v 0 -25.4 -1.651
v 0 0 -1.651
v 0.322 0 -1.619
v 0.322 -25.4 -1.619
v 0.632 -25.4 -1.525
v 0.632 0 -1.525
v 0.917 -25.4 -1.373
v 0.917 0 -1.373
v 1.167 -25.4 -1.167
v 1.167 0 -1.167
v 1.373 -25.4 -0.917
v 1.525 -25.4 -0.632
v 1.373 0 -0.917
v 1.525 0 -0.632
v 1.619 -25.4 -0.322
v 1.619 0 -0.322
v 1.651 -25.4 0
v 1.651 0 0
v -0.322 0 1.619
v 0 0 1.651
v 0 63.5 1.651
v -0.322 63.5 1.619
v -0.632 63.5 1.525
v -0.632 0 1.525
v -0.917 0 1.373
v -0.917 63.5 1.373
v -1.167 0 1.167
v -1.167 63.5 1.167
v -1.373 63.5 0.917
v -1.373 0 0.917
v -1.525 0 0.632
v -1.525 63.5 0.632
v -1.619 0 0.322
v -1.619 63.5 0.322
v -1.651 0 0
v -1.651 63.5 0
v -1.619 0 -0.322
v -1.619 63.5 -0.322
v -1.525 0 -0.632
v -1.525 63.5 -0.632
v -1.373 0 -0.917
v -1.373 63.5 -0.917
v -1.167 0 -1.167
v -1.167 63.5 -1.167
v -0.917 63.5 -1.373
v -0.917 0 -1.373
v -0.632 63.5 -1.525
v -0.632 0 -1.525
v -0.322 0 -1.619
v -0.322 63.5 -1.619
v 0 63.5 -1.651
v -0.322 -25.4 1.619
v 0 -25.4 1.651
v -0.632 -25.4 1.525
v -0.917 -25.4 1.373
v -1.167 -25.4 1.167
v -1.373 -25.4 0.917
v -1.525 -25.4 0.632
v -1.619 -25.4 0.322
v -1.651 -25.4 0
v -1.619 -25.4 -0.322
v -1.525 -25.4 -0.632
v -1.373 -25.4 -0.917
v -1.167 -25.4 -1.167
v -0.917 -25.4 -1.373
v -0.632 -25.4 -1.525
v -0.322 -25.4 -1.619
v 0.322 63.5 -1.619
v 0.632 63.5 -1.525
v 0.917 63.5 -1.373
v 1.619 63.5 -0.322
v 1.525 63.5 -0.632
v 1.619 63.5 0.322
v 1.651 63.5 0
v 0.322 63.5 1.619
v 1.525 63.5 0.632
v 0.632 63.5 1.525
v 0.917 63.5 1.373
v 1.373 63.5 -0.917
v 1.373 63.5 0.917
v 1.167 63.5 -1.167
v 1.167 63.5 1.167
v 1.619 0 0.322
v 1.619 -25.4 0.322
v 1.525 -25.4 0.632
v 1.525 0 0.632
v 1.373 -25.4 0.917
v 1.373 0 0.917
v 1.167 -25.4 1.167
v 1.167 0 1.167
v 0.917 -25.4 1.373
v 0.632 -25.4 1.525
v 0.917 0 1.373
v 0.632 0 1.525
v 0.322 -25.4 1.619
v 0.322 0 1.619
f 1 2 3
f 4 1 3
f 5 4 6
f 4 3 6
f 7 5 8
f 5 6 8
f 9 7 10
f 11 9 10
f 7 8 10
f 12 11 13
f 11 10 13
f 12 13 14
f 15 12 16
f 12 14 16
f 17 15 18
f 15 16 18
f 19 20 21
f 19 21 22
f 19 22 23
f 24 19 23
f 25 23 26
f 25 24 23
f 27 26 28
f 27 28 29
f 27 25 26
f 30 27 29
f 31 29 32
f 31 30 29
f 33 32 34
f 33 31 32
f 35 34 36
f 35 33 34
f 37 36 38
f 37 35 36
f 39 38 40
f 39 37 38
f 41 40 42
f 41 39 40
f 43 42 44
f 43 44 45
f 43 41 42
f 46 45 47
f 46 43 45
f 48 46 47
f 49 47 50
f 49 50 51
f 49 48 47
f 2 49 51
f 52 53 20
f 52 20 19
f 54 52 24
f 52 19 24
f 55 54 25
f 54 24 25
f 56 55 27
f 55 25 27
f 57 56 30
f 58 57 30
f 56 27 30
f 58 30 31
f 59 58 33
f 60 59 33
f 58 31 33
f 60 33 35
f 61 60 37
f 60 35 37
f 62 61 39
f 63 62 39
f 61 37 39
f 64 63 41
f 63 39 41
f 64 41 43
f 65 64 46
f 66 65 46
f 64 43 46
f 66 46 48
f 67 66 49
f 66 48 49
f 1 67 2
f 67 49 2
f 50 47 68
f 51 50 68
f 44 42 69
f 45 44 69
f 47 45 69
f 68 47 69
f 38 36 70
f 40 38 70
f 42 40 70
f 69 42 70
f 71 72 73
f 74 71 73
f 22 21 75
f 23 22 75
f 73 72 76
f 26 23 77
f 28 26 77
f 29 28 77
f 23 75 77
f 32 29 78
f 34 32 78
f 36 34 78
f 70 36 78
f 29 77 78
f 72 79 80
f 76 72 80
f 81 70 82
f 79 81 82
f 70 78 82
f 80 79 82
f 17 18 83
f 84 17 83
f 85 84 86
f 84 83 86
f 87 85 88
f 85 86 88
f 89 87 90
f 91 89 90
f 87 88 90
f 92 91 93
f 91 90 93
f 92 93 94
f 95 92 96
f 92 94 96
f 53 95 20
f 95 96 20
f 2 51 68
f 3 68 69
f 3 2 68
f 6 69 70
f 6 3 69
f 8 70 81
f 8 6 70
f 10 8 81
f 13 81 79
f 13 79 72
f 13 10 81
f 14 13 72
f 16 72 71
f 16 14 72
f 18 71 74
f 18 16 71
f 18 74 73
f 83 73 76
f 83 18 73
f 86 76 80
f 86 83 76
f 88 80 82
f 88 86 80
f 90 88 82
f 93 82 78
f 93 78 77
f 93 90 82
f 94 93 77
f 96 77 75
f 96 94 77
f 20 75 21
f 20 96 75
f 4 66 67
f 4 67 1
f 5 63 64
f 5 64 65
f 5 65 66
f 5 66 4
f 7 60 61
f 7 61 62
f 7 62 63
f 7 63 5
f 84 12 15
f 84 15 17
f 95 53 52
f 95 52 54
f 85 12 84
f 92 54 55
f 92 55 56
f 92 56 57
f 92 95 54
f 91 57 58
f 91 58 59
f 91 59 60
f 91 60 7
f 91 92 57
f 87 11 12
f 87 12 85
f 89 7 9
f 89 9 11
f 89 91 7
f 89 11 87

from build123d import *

# Parameters (mm, degrees)
F1_DEPTH = 63.5
F2_DEPTH = 25.4


with BuildPart() as f1:
    # F0 (on Front) → F1 (new body)
    with BuildSketch(Plane.XZ):
        with BuildLine():
            Line((0, -1.651), (0, 1.651))
            ThreePointArc((0, 1.651), (-1.651, 0), (0, -1.651))
        make_face()
        with BuildLine():
            ThreePointArc((0, -1.651), (1.1674332957, -1.1674332957), (1.651, 0))
            ThreePointArc((1.651, 0), (1.1674332957, 1.1674332957), (0, 1.651))
            Line((0, 1.651), (0, -1.651))
        make_face()
    extrude(amount=-F1_DEPTH)

    # F2 (add): a face of the model
    f2_faces = [f1.faces().sort_by_distance(p)[0] for p in [
        (0, 0, 0),
    ]]
    extrude(f2_faces, amount=F2_DEPTH)


solid = f1.part
